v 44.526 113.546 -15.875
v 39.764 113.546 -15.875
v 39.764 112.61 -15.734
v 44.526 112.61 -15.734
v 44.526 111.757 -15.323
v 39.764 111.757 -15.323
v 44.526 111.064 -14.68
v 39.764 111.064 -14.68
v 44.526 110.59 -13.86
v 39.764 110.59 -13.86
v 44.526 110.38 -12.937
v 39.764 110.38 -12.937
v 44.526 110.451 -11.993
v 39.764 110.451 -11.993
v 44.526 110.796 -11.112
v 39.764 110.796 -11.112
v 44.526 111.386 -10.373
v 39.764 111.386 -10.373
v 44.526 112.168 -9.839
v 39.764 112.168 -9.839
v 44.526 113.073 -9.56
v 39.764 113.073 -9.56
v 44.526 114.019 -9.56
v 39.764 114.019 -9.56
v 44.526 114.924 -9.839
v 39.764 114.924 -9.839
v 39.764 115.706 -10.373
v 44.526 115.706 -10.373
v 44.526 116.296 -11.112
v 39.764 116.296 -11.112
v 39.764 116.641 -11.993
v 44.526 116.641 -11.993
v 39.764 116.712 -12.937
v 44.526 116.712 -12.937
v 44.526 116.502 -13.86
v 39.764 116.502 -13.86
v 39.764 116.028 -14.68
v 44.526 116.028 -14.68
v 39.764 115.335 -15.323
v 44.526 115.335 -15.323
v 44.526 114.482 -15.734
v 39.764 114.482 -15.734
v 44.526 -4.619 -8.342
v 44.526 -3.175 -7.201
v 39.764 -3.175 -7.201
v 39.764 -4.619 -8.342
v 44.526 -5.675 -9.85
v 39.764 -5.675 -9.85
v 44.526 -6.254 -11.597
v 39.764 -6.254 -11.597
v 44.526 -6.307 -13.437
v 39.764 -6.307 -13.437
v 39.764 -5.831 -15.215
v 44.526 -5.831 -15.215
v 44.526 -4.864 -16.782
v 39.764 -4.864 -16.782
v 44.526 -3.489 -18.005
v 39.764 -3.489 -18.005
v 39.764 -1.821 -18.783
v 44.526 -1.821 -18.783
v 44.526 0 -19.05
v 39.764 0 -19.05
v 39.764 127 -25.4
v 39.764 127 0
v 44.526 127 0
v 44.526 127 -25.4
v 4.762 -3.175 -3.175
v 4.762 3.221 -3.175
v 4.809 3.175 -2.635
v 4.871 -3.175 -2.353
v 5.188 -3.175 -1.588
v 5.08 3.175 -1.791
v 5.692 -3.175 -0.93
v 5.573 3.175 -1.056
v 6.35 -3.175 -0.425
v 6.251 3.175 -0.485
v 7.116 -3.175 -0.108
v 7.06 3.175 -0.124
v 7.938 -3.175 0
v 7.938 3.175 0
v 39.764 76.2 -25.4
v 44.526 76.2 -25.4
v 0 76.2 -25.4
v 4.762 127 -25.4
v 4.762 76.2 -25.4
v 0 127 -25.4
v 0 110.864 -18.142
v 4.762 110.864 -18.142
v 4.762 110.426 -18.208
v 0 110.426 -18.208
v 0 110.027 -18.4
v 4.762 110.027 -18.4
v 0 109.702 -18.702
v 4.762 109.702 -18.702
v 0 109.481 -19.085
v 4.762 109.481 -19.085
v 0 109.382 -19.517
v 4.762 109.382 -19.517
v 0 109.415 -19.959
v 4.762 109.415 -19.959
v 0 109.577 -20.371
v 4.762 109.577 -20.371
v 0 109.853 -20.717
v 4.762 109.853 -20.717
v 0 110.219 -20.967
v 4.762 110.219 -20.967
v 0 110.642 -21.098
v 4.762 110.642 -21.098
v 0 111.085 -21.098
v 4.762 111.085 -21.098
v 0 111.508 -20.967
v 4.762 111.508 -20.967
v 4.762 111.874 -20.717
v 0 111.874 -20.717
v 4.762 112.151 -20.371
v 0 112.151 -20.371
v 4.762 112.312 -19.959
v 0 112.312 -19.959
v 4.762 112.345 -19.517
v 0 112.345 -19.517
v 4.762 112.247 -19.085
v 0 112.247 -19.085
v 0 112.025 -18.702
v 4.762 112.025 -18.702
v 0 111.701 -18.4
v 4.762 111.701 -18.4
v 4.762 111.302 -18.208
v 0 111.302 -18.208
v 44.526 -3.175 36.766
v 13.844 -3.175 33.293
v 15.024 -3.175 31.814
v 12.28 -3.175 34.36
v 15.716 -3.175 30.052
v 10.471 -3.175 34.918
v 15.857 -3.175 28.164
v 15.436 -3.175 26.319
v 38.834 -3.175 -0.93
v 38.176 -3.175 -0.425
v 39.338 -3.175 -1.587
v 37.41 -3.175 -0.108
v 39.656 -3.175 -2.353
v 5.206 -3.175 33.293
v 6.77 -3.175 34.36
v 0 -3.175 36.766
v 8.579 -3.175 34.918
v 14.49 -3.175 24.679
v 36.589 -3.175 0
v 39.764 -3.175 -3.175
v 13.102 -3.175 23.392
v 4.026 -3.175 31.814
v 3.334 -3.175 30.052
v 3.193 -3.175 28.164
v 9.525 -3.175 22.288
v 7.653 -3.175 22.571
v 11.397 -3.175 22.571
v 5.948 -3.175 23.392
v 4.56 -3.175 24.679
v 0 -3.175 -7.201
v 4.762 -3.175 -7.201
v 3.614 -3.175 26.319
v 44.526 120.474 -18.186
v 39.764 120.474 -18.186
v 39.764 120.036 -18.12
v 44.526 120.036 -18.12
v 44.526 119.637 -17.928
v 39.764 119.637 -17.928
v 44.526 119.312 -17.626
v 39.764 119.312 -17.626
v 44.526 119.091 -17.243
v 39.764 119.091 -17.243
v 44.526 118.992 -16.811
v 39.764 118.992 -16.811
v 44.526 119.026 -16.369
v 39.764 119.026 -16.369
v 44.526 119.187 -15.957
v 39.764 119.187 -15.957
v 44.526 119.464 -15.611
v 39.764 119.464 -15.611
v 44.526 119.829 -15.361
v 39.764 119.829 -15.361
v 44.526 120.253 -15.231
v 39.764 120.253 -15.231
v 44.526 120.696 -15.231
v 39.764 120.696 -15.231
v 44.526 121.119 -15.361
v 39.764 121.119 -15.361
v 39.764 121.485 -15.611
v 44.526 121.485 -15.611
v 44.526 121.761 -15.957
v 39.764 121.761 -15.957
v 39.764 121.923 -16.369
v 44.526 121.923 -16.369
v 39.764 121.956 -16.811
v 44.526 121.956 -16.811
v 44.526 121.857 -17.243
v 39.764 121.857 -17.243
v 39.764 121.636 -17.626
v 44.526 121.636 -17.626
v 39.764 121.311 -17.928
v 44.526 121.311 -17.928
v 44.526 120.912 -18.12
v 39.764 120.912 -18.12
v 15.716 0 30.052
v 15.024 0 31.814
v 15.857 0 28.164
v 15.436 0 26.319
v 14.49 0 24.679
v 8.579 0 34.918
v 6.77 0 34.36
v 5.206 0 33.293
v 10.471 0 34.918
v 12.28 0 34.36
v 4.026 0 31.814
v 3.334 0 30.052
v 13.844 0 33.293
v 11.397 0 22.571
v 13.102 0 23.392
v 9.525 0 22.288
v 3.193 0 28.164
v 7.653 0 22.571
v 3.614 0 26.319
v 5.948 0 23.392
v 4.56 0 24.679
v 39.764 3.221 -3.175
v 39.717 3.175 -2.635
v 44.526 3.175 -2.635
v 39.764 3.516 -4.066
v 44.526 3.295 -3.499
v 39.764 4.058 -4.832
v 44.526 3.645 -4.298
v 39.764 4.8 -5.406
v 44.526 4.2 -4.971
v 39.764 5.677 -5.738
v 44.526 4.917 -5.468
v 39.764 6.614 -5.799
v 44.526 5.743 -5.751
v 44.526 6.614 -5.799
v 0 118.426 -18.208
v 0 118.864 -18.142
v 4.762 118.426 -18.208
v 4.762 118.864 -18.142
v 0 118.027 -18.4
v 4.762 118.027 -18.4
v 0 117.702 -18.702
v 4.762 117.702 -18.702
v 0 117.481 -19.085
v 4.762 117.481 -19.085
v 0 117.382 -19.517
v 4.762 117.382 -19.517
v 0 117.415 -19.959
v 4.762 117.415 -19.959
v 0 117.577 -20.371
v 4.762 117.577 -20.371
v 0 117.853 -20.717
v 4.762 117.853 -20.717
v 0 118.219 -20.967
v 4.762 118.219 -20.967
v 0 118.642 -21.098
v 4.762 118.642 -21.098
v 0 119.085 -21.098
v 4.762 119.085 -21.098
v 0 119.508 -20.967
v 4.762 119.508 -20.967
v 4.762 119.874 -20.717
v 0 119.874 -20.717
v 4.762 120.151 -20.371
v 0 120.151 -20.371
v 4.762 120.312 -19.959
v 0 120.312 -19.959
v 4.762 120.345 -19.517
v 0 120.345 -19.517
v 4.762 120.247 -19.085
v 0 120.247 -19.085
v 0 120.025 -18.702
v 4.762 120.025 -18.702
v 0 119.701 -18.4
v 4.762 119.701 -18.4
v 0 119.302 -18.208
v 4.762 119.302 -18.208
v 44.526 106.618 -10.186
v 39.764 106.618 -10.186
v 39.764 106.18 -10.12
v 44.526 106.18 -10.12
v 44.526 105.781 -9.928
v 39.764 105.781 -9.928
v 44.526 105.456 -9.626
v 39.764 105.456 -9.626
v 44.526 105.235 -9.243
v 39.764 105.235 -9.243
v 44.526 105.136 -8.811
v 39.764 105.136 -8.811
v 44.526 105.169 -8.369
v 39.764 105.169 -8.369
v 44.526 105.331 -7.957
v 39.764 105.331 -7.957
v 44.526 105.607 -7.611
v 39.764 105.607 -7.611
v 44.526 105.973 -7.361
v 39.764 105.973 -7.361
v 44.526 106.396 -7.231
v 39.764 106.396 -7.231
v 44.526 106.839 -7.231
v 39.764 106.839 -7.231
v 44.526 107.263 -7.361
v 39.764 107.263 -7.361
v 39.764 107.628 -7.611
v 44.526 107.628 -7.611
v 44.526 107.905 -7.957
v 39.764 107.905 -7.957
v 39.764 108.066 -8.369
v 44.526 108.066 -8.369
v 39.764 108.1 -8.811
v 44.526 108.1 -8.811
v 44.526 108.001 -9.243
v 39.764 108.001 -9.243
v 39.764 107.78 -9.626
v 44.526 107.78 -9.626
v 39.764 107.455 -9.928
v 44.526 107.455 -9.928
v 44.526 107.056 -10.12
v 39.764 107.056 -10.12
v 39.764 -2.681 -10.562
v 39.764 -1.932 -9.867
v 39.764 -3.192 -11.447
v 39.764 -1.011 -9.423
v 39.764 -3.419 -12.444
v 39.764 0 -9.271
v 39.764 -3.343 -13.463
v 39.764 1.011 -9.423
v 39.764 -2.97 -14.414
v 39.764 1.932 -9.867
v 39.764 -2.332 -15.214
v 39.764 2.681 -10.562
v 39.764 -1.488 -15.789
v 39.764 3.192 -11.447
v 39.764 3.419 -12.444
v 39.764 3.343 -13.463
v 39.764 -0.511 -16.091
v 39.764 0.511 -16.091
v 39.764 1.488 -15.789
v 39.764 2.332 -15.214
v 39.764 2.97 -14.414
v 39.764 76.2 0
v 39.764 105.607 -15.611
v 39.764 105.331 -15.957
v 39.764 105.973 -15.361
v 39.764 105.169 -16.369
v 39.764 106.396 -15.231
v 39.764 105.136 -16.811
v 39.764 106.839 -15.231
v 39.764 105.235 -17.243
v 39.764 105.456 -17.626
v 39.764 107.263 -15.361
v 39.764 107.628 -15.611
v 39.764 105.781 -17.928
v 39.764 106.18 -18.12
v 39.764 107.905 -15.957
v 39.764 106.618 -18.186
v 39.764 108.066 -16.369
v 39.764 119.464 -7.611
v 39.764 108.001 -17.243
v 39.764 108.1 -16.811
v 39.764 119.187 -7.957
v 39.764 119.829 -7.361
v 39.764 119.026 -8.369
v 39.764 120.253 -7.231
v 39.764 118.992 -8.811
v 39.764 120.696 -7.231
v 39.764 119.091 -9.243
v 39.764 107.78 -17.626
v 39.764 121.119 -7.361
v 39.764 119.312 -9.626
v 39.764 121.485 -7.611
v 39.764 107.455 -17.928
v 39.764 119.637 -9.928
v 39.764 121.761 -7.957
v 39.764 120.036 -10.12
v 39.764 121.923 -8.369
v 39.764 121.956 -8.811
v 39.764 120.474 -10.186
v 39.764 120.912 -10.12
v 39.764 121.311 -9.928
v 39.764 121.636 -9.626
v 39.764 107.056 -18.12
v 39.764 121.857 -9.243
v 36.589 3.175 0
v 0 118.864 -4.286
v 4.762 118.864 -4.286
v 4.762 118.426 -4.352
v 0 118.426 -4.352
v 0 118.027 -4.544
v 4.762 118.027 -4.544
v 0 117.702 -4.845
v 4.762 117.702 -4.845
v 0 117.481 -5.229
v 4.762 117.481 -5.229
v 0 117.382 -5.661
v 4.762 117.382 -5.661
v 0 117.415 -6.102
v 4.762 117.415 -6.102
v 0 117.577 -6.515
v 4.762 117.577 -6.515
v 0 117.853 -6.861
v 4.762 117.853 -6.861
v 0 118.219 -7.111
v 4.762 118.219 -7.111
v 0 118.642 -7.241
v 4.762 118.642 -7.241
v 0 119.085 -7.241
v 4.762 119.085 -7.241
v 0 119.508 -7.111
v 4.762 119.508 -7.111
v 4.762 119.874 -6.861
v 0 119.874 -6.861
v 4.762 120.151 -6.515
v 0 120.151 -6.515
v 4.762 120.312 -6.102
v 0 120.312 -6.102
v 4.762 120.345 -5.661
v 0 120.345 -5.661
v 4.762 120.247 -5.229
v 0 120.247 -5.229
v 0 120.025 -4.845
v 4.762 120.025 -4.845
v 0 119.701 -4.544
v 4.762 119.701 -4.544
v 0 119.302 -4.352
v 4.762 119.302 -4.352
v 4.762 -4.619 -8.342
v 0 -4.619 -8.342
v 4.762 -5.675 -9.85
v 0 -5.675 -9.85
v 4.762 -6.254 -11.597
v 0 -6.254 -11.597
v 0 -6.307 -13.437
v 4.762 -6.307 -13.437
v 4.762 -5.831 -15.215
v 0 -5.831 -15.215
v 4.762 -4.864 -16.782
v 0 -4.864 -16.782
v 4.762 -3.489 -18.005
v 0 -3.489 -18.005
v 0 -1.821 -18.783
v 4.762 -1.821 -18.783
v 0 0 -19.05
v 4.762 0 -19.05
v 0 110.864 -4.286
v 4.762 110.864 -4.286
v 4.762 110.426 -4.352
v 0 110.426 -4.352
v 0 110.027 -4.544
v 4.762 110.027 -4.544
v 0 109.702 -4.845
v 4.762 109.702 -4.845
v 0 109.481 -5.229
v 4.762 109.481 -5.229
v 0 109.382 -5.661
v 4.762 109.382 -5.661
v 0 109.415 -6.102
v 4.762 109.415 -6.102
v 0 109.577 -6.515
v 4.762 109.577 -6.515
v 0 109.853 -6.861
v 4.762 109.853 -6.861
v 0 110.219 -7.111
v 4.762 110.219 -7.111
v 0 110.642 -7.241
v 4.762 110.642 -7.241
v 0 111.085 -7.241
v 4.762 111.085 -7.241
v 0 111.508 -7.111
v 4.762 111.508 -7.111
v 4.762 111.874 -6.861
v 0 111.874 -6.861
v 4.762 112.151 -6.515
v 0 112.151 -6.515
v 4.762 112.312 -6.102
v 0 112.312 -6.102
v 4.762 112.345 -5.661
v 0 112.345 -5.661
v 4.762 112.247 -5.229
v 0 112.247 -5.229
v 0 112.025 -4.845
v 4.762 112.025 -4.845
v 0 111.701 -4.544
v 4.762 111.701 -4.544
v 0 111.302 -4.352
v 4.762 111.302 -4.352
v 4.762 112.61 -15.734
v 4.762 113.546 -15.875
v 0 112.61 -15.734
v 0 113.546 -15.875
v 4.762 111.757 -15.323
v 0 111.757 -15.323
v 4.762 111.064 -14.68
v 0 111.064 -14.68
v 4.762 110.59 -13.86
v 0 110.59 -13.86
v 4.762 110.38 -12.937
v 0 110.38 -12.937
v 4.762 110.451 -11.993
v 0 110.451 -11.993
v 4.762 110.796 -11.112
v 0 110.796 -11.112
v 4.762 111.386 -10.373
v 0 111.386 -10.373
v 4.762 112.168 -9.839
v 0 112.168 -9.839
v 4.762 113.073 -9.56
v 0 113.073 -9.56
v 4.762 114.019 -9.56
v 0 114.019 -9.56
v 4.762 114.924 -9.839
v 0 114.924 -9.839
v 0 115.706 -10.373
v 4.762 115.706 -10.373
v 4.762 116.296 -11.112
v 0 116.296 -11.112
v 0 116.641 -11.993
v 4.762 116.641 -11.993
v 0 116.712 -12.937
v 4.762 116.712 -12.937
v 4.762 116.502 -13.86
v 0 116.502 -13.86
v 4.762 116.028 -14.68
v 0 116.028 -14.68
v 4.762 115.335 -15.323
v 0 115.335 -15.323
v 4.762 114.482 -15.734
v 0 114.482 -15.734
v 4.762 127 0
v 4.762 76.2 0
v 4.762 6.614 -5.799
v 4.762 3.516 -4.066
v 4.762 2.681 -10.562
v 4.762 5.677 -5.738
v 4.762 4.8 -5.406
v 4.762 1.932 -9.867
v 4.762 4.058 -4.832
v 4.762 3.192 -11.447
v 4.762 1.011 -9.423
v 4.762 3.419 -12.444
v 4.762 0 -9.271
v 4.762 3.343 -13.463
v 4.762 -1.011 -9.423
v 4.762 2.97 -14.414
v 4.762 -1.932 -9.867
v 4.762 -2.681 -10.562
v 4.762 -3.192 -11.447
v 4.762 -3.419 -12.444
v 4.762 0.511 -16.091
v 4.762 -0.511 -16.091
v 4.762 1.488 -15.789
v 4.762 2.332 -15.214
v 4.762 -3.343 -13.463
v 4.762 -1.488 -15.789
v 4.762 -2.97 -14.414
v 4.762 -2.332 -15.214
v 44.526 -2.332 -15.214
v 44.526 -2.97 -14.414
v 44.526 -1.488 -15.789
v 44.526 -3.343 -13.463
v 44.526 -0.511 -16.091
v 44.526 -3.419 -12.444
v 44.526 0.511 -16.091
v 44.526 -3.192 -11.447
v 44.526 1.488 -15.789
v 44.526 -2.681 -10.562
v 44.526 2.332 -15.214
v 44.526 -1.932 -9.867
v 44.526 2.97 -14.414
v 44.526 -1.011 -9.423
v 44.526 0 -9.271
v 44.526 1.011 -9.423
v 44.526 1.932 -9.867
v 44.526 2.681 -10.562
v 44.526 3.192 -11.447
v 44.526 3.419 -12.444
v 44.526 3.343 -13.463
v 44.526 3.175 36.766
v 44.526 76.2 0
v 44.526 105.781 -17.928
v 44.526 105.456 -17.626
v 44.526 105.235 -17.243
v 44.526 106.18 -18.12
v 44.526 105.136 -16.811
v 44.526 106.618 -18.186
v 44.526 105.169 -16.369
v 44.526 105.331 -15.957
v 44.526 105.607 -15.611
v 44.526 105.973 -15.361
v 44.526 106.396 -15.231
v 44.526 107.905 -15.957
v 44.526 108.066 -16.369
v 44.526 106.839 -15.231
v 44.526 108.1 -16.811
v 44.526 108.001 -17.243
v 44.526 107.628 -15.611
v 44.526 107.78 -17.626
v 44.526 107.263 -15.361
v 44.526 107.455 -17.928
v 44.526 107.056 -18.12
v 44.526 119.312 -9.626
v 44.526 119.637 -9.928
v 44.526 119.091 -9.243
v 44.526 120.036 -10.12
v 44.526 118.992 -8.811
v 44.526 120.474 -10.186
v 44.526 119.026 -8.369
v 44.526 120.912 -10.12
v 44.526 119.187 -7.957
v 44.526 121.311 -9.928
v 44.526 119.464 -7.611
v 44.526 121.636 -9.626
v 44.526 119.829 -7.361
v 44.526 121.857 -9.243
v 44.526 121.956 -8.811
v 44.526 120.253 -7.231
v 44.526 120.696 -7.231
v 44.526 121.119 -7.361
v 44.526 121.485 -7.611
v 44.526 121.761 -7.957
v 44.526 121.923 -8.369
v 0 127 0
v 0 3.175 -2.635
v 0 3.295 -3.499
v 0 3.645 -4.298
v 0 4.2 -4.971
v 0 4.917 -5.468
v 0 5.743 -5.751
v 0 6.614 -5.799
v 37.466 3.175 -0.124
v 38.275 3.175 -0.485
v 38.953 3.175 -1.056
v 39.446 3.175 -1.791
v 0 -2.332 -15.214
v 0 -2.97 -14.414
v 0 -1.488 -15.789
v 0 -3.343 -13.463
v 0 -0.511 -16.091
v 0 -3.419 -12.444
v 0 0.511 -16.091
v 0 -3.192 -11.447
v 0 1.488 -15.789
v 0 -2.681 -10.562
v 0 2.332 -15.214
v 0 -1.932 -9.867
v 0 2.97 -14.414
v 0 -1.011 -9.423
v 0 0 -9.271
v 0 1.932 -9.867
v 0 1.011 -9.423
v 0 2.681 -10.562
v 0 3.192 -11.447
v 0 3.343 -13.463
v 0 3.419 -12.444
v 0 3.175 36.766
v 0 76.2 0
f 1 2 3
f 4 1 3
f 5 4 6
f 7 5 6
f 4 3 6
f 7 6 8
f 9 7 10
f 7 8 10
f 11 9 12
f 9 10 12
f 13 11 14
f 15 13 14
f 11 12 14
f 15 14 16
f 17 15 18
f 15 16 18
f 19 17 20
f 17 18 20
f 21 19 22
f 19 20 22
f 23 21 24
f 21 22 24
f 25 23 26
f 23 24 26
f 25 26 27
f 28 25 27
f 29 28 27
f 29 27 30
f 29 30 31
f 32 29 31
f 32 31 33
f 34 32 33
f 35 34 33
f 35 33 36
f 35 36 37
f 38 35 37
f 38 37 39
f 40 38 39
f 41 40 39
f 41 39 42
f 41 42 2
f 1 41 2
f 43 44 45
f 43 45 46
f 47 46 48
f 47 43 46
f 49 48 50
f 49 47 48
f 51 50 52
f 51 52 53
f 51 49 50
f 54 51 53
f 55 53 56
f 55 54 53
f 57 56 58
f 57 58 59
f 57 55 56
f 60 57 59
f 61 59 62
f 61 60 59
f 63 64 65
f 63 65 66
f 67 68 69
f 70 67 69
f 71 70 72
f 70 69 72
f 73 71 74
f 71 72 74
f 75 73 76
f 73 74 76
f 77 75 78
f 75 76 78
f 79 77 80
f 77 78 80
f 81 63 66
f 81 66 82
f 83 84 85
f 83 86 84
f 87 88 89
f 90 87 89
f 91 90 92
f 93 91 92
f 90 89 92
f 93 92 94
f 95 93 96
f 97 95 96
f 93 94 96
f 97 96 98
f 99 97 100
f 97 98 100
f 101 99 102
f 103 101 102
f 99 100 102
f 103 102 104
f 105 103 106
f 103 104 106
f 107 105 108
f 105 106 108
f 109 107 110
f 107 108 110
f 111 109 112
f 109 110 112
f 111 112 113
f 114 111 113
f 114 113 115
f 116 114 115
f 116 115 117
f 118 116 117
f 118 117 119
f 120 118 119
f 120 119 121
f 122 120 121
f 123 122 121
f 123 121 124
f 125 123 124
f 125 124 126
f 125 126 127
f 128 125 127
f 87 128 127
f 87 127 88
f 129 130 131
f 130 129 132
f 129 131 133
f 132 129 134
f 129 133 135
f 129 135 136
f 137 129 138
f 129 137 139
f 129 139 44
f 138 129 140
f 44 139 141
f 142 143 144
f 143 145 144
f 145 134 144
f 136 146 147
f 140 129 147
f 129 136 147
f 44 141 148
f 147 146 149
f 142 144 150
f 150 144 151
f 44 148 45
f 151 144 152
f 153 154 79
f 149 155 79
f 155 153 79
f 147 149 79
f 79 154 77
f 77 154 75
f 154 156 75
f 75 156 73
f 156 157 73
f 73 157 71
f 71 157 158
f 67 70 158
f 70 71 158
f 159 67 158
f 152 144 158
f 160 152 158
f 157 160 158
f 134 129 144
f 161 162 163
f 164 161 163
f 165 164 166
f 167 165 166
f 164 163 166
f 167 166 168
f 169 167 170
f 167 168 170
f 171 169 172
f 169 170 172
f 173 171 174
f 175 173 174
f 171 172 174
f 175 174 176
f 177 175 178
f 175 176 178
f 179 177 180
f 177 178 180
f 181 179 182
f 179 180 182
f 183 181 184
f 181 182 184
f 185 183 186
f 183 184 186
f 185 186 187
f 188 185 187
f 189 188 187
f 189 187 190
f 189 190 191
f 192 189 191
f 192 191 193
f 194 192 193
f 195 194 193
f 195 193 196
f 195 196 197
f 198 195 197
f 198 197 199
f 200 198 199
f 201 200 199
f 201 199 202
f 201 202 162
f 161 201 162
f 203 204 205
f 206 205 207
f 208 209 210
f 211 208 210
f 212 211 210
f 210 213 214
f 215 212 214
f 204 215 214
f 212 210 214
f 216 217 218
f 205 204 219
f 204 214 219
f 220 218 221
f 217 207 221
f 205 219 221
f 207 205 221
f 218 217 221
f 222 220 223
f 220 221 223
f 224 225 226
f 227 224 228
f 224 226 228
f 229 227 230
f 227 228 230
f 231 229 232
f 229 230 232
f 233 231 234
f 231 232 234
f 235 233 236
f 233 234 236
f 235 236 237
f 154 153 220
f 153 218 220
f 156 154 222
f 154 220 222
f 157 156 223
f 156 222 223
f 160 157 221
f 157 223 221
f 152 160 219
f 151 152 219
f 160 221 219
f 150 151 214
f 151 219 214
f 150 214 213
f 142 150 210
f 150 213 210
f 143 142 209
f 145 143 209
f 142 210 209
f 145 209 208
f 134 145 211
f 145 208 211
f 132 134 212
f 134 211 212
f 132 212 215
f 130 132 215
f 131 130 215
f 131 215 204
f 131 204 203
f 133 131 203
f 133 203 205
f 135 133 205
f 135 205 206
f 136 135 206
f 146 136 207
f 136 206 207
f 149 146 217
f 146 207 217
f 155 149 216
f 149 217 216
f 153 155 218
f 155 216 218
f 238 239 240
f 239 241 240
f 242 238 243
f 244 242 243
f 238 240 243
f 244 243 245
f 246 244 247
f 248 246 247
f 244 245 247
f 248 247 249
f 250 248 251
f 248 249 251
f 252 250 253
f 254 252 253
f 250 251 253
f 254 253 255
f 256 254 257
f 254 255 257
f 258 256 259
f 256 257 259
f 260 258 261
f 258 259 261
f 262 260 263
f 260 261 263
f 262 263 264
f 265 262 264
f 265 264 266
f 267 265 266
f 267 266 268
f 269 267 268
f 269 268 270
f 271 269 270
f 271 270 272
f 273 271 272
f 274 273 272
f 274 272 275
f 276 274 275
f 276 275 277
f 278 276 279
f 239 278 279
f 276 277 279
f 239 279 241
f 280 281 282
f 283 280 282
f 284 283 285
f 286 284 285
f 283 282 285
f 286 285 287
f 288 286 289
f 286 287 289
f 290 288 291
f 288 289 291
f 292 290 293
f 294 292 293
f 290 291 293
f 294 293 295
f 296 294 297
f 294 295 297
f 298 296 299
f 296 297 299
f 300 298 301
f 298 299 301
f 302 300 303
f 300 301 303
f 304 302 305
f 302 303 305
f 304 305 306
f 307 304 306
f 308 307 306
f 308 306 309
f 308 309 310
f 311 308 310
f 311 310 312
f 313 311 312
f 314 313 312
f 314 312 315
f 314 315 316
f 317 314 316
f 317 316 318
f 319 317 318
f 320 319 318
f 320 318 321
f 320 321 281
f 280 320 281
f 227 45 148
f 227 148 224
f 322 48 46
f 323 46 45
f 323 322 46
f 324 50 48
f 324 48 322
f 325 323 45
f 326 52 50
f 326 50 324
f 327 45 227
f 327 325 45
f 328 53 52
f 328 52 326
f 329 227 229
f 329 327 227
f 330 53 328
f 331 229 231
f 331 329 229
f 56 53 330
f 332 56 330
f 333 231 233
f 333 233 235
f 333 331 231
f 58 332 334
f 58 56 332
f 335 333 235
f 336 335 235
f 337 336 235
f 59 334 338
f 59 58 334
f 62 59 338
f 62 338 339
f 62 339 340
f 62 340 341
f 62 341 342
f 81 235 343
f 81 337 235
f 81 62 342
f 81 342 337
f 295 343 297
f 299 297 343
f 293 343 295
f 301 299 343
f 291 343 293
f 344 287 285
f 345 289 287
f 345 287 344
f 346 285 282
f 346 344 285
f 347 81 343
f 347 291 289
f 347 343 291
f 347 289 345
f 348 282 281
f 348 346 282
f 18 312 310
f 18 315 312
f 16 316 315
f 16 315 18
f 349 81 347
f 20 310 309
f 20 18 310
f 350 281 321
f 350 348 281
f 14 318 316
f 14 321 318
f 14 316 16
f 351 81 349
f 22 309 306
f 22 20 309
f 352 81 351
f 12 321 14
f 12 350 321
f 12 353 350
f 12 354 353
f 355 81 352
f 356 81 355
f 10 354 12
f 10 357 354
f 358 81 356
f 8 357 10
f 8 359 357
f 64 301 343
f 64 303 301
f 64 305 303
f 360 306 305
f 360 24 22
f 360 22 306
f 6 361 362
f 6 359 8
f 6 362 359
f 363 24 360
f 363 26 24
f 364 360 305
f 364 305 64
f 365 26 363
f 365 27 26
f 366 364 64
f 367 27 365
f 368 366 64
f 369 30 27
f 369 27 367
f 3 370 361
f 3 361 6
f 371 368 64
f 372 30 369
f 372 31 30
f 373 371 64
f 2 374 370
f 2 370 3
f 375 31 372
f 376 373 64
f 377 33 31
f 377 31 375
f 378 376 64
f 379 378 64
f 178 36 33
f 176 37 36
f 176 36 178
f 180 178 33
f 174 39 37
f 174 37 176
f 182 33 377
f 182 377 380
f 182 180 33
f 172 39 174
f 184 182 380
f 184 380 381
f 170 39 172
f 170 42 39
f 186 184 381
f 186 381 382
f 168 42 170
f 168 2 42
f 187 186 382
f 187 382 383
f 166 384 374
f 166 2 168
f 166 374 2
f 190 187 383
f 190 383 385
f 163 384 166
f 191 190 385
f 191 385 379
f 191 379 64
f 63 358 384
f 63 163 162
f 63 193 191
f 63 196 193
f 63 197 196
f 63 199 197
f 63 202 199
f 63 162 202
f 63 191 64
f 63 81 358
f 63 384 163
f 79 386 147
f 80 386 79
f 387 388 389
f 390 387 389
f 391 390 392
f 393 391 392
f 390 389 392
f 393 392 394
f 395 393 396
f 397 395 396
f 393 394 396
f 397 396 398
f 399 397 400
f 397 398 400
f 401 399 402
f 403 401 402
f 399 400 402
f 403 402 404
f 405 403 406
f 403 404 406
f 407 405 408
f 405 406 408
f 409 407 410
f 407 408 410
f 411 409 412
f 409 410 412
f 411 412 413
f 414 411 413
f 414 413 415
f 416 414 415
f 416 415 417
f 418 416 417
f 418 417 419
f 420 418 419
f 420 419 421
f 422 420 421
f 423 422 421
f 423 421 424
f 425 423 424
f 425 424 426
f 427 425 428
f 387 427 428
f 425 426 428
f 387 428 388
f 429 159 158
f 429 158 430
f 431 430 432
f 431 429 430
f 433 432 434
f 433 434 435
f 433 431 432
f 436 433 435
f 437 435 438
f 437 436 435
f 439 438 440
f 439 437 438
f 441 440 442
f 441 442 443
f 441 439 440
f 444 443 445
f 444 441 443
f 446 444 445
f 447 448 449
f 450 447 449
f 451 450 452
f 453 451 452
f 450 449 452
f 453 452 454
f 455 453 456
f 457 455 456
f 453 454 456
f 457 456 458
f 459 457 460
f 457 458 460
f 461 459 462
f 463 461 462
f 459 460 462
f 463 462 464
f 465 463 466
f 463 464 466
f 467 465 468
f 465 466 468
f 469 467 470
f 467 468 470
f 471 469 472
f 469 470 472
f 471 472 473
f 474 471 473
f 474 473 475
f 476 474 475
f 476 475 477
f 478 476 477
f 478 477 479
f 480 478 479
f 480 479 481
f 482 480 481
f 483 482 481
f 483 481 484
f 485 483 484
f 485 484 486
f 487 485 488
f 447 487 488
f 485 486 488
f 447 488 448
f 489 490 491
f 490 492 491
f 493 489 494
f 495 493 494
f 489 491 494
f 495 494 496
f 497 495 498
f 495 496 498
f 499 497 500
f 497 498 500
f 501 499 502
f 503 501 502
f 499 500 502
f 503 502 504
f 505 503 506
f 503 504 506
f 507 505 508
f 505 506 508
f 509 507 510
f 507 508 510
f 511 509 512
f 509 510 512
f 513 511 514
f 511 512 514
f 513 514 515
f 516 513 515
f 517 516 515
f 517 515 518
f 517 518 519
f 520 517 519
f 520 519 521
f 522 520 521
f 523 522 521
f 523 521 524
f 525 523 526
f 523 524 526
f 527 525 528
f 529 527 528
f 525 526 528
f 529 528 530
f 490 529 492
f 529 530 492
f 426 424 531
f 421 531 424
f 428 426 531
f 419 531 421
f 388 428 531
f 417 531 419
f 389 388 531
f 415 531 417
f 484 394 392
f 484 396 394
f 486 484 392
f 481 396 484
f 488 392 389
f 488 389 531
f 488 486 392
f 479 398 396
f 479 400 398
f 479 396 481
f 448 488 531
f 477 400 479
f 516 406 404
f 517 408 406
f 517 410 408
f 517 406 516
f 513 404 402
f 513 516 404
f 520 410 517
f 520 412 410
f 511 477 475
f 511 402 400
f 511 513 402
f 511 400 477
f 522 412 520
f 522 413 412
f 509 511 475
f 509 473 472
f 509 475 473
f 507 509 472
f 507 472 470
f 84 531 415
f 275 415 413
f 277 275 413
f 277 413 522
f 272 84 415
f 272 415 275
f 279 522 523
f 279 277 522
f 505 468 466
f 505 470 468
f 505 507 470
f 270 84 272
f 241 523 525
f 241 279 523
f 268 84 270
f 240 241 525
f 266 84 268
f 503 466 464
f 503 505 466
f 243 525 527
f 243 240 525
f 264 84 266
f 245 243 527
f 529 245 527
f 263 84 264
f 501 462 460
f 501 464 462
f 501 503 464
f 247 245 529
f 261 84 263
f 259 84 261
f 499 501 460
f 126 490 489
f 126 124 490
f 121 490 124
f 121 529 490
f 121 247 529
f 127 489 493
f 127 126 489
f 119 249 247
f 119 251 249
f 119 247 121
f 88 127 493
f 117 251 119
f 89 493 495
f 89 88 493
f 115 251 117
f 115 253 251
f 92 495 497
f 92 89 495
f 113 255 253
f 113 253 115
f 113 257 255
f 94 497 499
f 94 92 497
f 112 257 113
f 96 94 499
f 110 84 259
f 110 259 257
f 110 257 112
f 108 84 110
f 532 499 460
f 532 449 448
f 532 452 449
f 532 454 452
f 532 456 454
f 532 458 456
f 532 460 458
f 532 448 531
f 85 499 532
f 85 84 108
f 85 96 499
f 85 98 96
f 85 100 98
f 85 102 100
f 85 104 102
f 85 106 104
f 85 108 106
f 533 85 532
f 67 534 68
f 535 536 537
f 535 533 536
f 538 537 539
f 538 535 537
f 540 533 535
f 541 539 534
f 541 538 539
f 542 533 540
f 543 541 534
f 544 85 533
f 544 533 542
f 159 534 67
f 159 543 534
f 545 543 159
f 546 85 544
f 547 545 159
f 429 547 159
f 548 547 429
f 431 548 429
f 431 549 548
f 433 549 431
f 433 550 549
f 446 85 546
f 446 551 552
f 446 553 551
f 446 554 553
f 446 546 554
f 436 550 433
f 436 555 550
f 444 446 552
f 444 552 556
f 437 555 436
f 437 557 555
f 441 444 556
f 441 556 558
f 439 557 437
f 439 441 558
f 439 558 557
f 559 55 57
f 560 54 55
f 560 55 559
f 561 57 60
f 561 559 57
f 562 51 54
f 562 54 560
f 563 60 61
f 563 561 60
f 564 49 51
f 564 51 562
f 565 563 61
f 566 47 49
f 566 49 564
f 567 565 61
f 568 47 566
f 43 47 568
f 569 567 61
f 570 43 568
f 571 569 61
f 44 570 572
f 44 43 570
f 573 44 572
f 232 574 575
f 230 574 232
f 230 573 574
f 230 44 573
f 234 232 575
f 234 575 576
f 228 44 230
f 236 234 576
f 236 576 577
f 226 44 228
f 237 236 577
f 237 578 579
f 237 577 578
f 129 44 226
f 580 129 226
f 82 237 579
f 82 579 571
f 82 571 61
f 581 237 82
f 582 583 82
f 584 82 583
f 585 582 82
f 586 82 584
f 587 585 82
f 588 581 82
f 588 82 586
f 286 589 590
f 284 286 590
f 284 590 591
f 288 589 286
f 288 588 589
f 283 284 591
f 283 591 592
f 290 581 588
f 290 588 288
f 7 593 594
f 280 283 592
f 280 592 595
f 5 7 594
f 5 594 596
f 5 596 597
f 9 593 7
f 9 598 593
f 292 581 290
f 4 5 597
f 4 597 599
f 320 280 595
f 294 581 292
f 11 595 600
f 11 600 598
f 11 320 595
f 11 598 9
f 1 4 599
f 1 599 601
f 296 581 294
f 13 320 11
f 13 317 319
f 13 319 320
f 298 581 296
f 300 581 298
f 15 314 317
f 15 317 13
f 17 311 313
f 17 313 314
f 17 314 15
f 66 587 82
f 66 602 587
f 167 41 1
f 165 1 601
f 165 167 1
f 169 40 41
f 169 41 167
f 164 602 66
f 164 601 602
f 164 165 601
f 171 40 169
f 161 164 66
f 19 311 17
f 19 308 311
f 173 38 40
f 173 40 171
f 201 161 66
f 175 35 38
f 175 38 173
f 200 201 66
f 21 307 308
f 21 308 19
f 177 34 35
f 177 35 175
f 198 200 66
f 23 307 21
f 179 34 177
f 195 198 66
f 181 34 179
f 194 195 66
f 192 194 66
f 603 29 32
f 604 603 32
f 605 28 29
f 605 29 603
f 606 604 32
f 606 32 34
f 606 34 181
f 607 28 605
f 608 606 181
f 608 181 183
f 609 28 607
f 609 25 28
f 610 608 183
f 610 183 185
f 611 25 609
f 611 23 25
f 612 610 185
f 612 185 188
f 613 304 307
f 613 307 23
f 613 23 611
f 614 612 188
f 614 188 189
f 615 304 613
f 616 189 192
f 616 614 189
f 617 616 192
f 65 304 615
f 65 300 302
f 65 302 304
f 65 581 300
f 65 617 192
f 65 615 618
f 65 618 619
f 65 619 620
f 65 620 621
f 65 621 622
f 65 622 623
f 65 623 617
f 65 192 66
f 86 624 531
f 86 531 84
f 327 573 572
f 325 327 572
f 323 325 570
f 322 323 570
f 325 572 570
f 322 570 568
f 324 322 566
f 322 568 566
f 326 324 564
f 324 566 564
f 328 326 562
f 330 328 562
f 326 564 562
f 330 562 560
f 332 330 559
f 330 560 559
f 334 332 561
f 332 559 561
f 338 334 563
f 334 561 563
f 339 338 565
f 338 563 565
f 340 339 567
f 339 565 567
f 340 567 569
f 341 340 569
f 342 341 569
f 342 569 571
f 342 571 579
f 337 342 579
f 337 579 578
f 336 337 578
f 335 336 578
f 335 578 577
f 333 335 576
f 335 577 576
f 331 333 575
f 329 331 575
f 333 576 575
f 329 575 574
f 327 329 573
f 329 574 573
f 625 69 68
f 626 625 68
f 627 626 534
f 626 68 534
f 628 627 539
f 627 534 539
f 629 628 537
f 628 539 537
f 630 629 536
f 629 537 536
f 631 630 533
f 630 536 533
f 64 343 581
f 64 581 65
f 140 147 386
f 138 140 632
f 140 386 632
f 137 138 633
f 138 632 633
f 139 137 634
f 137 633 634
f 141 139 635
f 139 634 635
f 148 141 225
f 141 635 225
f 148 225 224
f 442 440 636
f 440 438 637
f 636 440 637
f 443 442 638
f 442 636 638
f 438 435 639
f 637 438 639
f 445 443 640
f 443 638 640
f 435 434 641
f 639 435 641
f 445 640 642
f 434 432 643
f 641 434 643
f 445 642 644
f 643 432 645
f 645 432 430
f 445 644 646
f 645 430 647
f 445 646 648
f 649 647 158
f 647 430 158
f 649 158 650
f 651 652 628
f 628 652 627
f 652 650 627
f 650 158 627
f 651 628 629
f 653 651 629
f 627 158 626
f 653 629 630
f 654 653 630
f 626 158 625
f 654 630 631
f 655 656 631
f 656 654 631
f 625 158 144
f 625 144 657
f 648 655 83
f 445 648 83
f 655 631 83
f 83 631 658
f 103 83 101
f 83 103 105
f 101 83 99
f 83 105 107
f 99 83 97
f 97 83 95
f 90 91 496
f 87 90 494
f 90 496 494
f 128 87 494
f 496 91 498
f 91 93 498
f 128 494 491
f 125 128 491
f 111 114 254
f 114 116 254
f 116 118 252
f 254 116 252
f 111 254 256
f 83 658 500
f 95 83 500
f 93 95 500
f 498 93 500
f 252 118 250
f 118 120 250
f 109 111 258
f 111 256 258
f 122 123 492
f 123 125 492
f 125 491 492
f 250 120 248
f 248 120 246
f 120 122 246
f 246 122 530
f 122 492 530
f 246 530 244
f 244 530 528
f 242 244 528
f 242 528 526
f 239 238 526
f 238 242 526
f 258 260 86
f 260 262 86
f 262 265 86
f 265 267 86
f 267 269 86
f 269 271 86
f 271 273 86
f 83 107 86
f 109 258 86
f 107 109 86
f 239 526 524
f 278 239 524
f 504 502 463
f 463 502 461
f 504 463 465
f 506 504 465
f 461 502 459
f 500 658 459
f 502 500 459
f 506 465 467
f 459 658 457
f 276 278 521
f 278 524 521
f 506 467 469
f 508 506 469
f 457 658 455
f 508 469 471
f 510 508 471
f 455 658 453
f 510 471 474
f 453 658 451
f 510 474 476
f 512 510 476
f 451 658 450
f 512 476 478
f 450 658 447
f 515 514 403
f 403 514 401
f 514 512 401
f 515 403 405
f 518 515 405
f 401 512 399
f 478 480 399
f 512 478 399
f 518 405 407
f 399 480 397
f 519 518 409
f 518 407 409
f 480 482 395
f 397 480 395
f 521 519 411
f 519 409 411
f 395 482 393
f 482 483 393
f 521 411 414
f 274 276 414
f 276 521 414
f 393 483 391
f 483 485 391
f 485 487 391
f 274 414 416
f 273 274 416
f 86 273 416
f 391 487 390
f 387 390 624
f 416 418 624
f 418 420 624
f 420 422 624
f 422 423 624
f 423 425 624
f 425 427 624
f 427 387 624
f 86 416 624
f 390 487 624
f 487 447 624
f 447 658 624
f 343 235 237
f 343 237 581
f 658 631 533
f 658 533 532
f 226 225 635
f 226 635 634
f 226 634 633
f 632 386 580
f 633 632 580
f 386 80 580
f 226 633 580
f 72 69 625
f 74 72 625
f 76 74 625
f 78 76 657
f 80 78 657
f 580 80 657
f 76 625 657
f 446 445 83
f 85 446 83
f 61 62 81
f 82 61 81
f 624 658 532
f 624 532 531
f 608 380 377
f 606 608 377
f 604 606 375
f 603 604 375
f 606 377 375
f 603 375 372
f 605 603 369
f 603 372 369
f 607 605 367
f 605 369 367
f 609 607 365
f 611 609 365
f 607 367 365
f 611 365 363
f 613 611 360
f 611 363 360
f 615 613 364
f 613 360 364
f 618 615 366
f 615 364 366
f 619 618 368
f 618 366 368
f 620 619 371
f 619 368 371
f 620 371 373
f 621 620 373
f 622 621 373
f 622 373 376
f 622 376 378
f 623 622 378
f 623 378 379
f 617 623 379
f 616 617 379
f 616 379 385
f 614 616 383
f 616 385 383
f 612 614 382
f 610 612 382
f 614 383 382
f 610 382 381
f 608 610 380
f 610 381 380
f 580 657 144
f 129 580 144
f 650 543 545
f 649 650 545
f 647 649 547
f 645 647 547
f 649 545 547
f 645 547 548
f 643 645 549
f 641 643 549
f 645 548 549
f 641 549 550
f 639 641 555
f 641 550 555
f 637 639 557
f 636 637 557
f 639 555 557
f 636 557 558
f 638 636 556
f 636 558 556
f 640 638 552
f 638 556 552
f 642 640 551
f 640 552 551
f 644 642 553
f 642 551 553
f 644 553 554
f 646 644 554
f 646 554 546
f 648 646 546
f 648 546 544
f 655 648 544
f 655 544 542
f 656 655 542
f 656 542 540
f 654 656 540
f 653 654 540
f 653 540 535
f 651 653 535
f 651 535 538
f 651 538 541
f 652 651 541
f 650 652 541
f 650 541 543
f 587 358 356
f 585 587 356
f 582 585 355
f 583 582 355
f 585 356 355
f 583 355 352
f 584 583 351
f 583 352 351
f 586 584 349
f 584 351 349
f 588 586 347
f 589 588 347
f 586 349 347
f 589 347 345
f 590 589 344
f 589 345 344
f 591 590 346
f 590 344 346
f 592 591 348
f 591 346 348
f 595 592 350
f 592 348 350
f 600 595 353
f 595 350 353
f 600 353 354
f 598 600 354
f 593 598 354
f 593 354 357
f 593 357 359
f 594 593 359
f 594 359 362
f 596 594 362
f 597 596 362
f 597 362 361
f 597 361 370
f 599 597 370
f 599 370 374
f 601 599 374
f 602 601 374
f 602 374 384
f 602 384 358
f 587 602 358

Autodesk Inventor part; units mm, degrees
ref_plane "YZ Plane" through (0, 0, 0) normal (1, 0, 0) x (0, 1, 0)
ref_plane "XZ Plane" through (0, 0, 0) normal (0, 1, 0) x (-1, 0, 0)
ref_plane "XY Plane" through (0, 0, 0) normal (0, 0, 1) x (1, 0, 0)
sketch "Sketch1" plane through (0, 0, 0) normal (1, 0, 0) x (0, 1, 0)
  line L0 (0, 0) -> (127, 0)
  line L1 (127, 0) -> (127, -25.4)
  line L2 (127, -25.4) -> (0, -25.4)
  line L3 (0, -25.4) -> (0, 0)
  line L4 (0, -6.35) -> (0, -19.05)
  line L5 (0, -6.35) -> (76.2, 0)
  line L6 (0, -19.05) -> (76.2, -25.4)
  dimension "d0" = 127
  dimension "d1" = 25.4
  dimension "d18" = 12.7
  dimension "d19" = 6.35
  dimension "d20" = 50.8
  dimension "d21" = 50.8
ref_plane "Work Plane1" through (44.5262, 0, 0) normal (1, 0, 0) x (0, 0, -1)
sketch "Sketch2" plane through (44.5262, 0, 0) normal (1, 0, 0) x (0, 0, -1)
  line L0 (0, 127) -> (0, 0) projected
  line L1 (0, 0) -> (25.4, 0) projected
  line L2 (25.4, 0) -> (25.4, 127) projected
  line L3 (25.4, 127) -> (0, 127) projected
  line L4 (0, 0) -> (25.4, 0) projected
  circle A0 centre (12.7, 0) radius 6.35
  dimension "d5" = 25.4
  dimension "d6" = 12.7
  dimension "d7" = 12.7
  dimension "d8" = 0
extrude "Extrusion2" add sketch "Sketch2" against normal blind 44.5262 contours A0 L1 | L1 A0
ref_plane "Work Plane2" through (44.5262, 0, 0) normal (1, 0, 0) x (0, 0, -1)
extrude "Extrusion3" add sketch "Sketch1" along normal blind 44.5262 contours L0 L1 L2 L6 L3 L5
sketch "Sketch4" plane through (0, 0, 0) normal (-1, 0, 0) x (0, 0, 1)
  arc A0 (-19.05, 0) -> (-6.35, 0) centre (-12.7, 0) ccw projected
  line L0 (0, 76.2) -> (-6.35, 0) projected
  line L1 (0, 127) -> (0, 76.2) projected
  line L2 (-25.4, 127) -> (0, 127) projected
  line L3 (-25.4, 76.2) -> (-25.4, 127) projected
  line L4 (-19.05, 0) -> (-25.4, 76.2) projected
  point P0 (0, 0)
hole "Hole2" at (0, 0, -12.7) direction (1, 0, 0) diameter 6.858 end through all
sketch "Sketch5" plane through (0, 0, 0) normal (-1, 0, 0) x (0, 0, 1)
  circle A0 centre (-12.7, 0) radius 3.429 projected
  line L0 (0, 76.2) -> (-6.35, 0) projected
  line L1 (0, 127) -> (0, 76.2) projected
  line L2 (-25.4, 127) -> (0, 127) projected
  line L3 (-25.4, 76.2) -> (-25.4, 127) projected
  line L4 (-19.05, 0) -> (-25.4, 76.2) projected
  line L5 (-7.6835, 3.175) -> (36.7665, 3.175)
  line L6 (36.7665, 3.175) -> (36.7665, -3.175)
  line L7 (36.7665, -3.175) -> (-7.6835, -3.175)
  line L8 (-7.6835, -3.175) -> (-7.6835, 3.175)
  arc A1 (-19.05, 0) -> (-6.35, 0) centre (-12.7, 0) ccw projected
  point P0 (0, 0)
  dimension "d31" = 44.45
  dimension "d32" = 6.35
  dimension "d35" = 127
  dimension "d36" = 123.825
  dimension "d95" = 6.858
  dimension "d96" = 5.0165
extrude "Extrusion4" add sketch "Sketch5" against normal blind 44.5262 contours L5 L6 L7 A1 L0 | L0 A1 L7 L8 L5
sketch "Sketch8" plane through (0, 76.2, -25.4) normal (0, 0, -1) x (-1, 0, 0)
  line L0 (0, 0) -> (0, 50.8) projected
  line L1 (0, 50.8) -> (-44.5262, 50.8) projected
  line L2 (-44.5262, 0) -> (-44.5262, 50.8) projected
  line L3 (0, 0) -> (-44.5262, 0) projected
  line L4 (0, -76.2) -> (0, 0) projected
  line L5 (0, 0) -> (-44.5262, 0) projected
  line L6 (-44.5262, -76.2) -> (-44.5262, 0) projected
  line L7 (0, 50.8) -> (-44.5262, 50.8) projected
  line L8 (-39.7637, 50.8) -> (-4.7625, 50.8)
  line L9 (-4.7625, 50.8) -> (-4.7625, -98.425)
  line L10 (-4.7625, -98.425) -> (-39.7637, -98.425)
  line L11 (-39.7637, -98.425) -> (-39.7637, 50.8)
  line L12 (0, -76.2) -> (-44.5262, -76.2) projected
  point P0 (0, -76.2)
  dimension "d41" = 44.5262
  dimension "d43" = 35.0012
  dimension "d44" = 4.7625
  dimension "d45" = 149.225
extrude "Extrusion5" cut sketch "Sketch8" against normal blind 25.4 contours L9 L12 L11 L3 | L3 L11 L1 L9 | L9 L10 L11 L12
fillet "Fillet1" radius 3.175 2 edges at (39.7637, 0, 0) (4.7625, 0, 0)
fillet "Fillet2" radius 3.175 2 edges at (2.3812, 3.175, -6.0854) (42.1449, 3.175, -6.0854)
sketch "Sketch9" plane through (0, 0, 0) normal (-1, 0, 0) x (0, 0, 1)
  line L0 (0, 76.2) -> (-5.7989, 6.6137) projected
  line L1 (0, 127) -> (0, 76.2) projected
  line L2 (-25.4, 127) -> (0, 127) projected
  line L3 (-25.4, 76.2) -> (-25.4, 127) projected
  line L4 (-19.05, 0) -> (-25.4, 76.2) projected
  circle A0 centre (-12.7, 0) radius 3.429 projected
  circle A1 centre (-12.7, 114.8637) radius 8
  line L5 (-19.6282, 118.8637) -> (-5.7718, 118.8637)
  line L6 (-5.7718, 118.8637) -> (-5.7718, 110.8637)
  line L7 (-5.7718, 110.8637) -> (-19.6282, 110.8637)
  line L8 (-19.6282, 110.8637) -> (-19.6282, 118.8637)
  arc A2 (-19.05, 0) -> (-7.2007, -3.175) centre (-12.7, 0) ccw projected
  line L9 (36.7665, -3.175) -> (-7.2007, -3.175) projected
  line L10 (36.7665, 3.175) -> (36.7665, -3.175) projected
  line L11 (-2.6348, 3.175) -> (36.7665, 3.175) projected
  arc A3 (-5.7989, 6.6137) -> (-2.6348, 3.175) centre (-2.6348, 6.35) ccw projected
  point P0 (0, 0)
  dimension "d50" = 16
  dimension "d51" = 25.4
  dimension "d52" = 12.7
  dimension "d53" = 8
  dimension "d54" = 4
hole "Hole3" at (0, 118.8637, -19.6282) at (0, 110.8637, -19.6282) at (0, 118.8637, -5.7718) at (0, 110.8637, -5.7718) direction (1, 0, 0) diameter 2.9718 depth 25.4 tip angle 118
sketch "Sketch10" plane through (44.5262, 0, 0) normal (1, 0, 0) x (0, 0, -1)
  line L0 (19.05, 0) -> (25.4, 76.2) projected
  line L1 (25.4, 76.2) -> (25.4, 127) projected
  line L2 (25.4, 127) -> (0, 127) projected
  line L3 (0, 127) -> (0, 76.2) projected
  line L4 (0, 76.2) -> (5.7989, 6.6137) projected
  circle A0 centre (12.7, 0) radius 3.429 projected
  circle A1 centre (12.7, 113.546) radius 8
  line L5 (16.7, 106.6178) -> (8.7, 106.6178)
  line L6 (8.7, 106.6178) -> (8.7, 120.4742)
  line L7 (8.7, 120.4742) -> (16.7, 120.4742)
  line L8 (16.7, 120.4742) -> (16.7, 106.6178)
  arc A2 (7.2007, -3.175) -> (19.05, 0) centre (12.7, 0) ccw projected
  arc A3 (2.6348, 3.175) -> (5.7989, 6.6137) centre (2.6348, 6.35) ccw projected
  line L9 (2.6348, 3.175) -> (-36.7665, 3.175) projected
  line L10 (-36.7665, 3.175) -> (-36.7665, -3.175) projected
  line L11 (-36.7665, -3.175) -> (7.2007, -3.175) projected
  point P0 (0, 0)
  dimension "d62" = 16
  dimension "d63" = 25.4
  dimension "d64" = 12.7
  dimension "d65" = 8
  dimension "d66" = 4
hole "Hole4" at (44.5262, 106.6178, -16.7) at (44.5262, 106.6178, -8.7) at (44.5262, 120.4742, -8.7) at (44.5262, 120.4742, -16.7) direction (-1, 0, 0) diameter 2.9718 depth 25.4 tip angle 118
sketch "Sketch11" plane through (0, -3.175, -7.2007) normal (0, -1, 0) x (1, 0, 0)
  line L0 (4.7625, 0) -> (4.7625, 4.0257) projected
  arc A0 (7.9375, 7.2007) -> (4.7625, 4.0257) centre (7.9375, 4.0257) ccw projected
  line L1 (7.9375, 7.2007) -> (36.5887, 7.2007) projected
  arc A1 (39.7637, 4.0257) -> (36.5887, 7.2007) centre (36.5887, 4.0257) ccw projected
  line L2 (39.7637, 4.0257) -> (39.7637, 0) projected
  line L3 (44.5262, 43.9672) -> (44.5262, 0) projected
  line L4 (0, 43.9672) -> (44.5262, 43.9672) projected
  line L5 (0, 43.9672) -> (0, 0) projected
  line L6 (44.5262, 0) -> (39.7637, 0) projected
  line L7 (4.7625, 0) -> (0, 0) projected
  point P0 (0, 7.2007)
  point P1 (9.525, 35.8392)
  dimension "d74" = 8.128
  dimension "d75" = 44.5262
  dimension "d97" = 9.525
hole "Hole5" at (9.525, -3.175, 28.6385) direction (0, 1, 0) diameter 12.7 depth 3.175
sketch "Sketch12" plane through (44.5262, 0, 0) normal (1, 0, 0) x (0, 0, -1)
  circle A0 centre (8.7, 120.4742) radius 1.4859 projected
  circle A1 centre (16.7, 106.6178) radius 1.4859 projected
  circle A2 centre (8.7, 106.6178) radius 1.4859 projected
  circle A3 centre (16.7, 120.4742) radius 1.4859 projected
  line L0 (19.05, 0) -> (25.4, 76.2) projected
  line L1 (25.4, 76.2) -> (25.4, 127) projected
  line L2 (25.4, 127) -> (0, 127) projected
  line L3 (0, 127) -> (0, 76.2) projected
  line L4 (0, 76.2) -> (5.7989, 6.6137) projected
  circle A4 centre (12.7, 0) radius 3.429 projected
  arc A5 (7.2007, -3.175) -> (19.05, 0) centre (12.7, 0) ccw projected
  arc A6 (2.6348, 3.175) -> (5.7989, 6.6137) centre (2.6348, 6.35) ccw projected
  line L5 (2.6348, 3.175) -> (-36.7665, 3.175) projected
  line L6 (-36.7665, 3.175) -> (-36.7665, -3.175) projected
  line L7 (-36.7665, -3.175) -> (7.2007, -3.175) projected
  point P0 (0, 0)
  point P1 (12.7, 113.546)
  dimension "d84" = 25.4
  dimension "d85" = 12.7
  dimension "d86" = 13.8564
  dimension "d87" = 6.9282
hole "Hole6" at (44.5262, 113.546, -12.7) direction (-1, 0, 0) diameter 6.35 end through all
equation "\"d19\" = -0.5 * d18 + 0.5 * d1"
equation "\"d21\" = d20"
equation "\"d7\" = 0.5 * d5"
equation "\"d36\" = d35 - 0.5 * d32"
equation "\"d44\" = -0.5 * d43 + 0.5 * d41"
equation "\"d52\" = 0.5 * d51"
equation "\"d54\" = 0.5 * d53"
equation "\"d64\" = 0.5 * d63"
equation "\"d66\" = 0.5 * d65"
equation "\"d87\" = 0.5 * d86"
properties part number "WheelIntakeMount3.0"
